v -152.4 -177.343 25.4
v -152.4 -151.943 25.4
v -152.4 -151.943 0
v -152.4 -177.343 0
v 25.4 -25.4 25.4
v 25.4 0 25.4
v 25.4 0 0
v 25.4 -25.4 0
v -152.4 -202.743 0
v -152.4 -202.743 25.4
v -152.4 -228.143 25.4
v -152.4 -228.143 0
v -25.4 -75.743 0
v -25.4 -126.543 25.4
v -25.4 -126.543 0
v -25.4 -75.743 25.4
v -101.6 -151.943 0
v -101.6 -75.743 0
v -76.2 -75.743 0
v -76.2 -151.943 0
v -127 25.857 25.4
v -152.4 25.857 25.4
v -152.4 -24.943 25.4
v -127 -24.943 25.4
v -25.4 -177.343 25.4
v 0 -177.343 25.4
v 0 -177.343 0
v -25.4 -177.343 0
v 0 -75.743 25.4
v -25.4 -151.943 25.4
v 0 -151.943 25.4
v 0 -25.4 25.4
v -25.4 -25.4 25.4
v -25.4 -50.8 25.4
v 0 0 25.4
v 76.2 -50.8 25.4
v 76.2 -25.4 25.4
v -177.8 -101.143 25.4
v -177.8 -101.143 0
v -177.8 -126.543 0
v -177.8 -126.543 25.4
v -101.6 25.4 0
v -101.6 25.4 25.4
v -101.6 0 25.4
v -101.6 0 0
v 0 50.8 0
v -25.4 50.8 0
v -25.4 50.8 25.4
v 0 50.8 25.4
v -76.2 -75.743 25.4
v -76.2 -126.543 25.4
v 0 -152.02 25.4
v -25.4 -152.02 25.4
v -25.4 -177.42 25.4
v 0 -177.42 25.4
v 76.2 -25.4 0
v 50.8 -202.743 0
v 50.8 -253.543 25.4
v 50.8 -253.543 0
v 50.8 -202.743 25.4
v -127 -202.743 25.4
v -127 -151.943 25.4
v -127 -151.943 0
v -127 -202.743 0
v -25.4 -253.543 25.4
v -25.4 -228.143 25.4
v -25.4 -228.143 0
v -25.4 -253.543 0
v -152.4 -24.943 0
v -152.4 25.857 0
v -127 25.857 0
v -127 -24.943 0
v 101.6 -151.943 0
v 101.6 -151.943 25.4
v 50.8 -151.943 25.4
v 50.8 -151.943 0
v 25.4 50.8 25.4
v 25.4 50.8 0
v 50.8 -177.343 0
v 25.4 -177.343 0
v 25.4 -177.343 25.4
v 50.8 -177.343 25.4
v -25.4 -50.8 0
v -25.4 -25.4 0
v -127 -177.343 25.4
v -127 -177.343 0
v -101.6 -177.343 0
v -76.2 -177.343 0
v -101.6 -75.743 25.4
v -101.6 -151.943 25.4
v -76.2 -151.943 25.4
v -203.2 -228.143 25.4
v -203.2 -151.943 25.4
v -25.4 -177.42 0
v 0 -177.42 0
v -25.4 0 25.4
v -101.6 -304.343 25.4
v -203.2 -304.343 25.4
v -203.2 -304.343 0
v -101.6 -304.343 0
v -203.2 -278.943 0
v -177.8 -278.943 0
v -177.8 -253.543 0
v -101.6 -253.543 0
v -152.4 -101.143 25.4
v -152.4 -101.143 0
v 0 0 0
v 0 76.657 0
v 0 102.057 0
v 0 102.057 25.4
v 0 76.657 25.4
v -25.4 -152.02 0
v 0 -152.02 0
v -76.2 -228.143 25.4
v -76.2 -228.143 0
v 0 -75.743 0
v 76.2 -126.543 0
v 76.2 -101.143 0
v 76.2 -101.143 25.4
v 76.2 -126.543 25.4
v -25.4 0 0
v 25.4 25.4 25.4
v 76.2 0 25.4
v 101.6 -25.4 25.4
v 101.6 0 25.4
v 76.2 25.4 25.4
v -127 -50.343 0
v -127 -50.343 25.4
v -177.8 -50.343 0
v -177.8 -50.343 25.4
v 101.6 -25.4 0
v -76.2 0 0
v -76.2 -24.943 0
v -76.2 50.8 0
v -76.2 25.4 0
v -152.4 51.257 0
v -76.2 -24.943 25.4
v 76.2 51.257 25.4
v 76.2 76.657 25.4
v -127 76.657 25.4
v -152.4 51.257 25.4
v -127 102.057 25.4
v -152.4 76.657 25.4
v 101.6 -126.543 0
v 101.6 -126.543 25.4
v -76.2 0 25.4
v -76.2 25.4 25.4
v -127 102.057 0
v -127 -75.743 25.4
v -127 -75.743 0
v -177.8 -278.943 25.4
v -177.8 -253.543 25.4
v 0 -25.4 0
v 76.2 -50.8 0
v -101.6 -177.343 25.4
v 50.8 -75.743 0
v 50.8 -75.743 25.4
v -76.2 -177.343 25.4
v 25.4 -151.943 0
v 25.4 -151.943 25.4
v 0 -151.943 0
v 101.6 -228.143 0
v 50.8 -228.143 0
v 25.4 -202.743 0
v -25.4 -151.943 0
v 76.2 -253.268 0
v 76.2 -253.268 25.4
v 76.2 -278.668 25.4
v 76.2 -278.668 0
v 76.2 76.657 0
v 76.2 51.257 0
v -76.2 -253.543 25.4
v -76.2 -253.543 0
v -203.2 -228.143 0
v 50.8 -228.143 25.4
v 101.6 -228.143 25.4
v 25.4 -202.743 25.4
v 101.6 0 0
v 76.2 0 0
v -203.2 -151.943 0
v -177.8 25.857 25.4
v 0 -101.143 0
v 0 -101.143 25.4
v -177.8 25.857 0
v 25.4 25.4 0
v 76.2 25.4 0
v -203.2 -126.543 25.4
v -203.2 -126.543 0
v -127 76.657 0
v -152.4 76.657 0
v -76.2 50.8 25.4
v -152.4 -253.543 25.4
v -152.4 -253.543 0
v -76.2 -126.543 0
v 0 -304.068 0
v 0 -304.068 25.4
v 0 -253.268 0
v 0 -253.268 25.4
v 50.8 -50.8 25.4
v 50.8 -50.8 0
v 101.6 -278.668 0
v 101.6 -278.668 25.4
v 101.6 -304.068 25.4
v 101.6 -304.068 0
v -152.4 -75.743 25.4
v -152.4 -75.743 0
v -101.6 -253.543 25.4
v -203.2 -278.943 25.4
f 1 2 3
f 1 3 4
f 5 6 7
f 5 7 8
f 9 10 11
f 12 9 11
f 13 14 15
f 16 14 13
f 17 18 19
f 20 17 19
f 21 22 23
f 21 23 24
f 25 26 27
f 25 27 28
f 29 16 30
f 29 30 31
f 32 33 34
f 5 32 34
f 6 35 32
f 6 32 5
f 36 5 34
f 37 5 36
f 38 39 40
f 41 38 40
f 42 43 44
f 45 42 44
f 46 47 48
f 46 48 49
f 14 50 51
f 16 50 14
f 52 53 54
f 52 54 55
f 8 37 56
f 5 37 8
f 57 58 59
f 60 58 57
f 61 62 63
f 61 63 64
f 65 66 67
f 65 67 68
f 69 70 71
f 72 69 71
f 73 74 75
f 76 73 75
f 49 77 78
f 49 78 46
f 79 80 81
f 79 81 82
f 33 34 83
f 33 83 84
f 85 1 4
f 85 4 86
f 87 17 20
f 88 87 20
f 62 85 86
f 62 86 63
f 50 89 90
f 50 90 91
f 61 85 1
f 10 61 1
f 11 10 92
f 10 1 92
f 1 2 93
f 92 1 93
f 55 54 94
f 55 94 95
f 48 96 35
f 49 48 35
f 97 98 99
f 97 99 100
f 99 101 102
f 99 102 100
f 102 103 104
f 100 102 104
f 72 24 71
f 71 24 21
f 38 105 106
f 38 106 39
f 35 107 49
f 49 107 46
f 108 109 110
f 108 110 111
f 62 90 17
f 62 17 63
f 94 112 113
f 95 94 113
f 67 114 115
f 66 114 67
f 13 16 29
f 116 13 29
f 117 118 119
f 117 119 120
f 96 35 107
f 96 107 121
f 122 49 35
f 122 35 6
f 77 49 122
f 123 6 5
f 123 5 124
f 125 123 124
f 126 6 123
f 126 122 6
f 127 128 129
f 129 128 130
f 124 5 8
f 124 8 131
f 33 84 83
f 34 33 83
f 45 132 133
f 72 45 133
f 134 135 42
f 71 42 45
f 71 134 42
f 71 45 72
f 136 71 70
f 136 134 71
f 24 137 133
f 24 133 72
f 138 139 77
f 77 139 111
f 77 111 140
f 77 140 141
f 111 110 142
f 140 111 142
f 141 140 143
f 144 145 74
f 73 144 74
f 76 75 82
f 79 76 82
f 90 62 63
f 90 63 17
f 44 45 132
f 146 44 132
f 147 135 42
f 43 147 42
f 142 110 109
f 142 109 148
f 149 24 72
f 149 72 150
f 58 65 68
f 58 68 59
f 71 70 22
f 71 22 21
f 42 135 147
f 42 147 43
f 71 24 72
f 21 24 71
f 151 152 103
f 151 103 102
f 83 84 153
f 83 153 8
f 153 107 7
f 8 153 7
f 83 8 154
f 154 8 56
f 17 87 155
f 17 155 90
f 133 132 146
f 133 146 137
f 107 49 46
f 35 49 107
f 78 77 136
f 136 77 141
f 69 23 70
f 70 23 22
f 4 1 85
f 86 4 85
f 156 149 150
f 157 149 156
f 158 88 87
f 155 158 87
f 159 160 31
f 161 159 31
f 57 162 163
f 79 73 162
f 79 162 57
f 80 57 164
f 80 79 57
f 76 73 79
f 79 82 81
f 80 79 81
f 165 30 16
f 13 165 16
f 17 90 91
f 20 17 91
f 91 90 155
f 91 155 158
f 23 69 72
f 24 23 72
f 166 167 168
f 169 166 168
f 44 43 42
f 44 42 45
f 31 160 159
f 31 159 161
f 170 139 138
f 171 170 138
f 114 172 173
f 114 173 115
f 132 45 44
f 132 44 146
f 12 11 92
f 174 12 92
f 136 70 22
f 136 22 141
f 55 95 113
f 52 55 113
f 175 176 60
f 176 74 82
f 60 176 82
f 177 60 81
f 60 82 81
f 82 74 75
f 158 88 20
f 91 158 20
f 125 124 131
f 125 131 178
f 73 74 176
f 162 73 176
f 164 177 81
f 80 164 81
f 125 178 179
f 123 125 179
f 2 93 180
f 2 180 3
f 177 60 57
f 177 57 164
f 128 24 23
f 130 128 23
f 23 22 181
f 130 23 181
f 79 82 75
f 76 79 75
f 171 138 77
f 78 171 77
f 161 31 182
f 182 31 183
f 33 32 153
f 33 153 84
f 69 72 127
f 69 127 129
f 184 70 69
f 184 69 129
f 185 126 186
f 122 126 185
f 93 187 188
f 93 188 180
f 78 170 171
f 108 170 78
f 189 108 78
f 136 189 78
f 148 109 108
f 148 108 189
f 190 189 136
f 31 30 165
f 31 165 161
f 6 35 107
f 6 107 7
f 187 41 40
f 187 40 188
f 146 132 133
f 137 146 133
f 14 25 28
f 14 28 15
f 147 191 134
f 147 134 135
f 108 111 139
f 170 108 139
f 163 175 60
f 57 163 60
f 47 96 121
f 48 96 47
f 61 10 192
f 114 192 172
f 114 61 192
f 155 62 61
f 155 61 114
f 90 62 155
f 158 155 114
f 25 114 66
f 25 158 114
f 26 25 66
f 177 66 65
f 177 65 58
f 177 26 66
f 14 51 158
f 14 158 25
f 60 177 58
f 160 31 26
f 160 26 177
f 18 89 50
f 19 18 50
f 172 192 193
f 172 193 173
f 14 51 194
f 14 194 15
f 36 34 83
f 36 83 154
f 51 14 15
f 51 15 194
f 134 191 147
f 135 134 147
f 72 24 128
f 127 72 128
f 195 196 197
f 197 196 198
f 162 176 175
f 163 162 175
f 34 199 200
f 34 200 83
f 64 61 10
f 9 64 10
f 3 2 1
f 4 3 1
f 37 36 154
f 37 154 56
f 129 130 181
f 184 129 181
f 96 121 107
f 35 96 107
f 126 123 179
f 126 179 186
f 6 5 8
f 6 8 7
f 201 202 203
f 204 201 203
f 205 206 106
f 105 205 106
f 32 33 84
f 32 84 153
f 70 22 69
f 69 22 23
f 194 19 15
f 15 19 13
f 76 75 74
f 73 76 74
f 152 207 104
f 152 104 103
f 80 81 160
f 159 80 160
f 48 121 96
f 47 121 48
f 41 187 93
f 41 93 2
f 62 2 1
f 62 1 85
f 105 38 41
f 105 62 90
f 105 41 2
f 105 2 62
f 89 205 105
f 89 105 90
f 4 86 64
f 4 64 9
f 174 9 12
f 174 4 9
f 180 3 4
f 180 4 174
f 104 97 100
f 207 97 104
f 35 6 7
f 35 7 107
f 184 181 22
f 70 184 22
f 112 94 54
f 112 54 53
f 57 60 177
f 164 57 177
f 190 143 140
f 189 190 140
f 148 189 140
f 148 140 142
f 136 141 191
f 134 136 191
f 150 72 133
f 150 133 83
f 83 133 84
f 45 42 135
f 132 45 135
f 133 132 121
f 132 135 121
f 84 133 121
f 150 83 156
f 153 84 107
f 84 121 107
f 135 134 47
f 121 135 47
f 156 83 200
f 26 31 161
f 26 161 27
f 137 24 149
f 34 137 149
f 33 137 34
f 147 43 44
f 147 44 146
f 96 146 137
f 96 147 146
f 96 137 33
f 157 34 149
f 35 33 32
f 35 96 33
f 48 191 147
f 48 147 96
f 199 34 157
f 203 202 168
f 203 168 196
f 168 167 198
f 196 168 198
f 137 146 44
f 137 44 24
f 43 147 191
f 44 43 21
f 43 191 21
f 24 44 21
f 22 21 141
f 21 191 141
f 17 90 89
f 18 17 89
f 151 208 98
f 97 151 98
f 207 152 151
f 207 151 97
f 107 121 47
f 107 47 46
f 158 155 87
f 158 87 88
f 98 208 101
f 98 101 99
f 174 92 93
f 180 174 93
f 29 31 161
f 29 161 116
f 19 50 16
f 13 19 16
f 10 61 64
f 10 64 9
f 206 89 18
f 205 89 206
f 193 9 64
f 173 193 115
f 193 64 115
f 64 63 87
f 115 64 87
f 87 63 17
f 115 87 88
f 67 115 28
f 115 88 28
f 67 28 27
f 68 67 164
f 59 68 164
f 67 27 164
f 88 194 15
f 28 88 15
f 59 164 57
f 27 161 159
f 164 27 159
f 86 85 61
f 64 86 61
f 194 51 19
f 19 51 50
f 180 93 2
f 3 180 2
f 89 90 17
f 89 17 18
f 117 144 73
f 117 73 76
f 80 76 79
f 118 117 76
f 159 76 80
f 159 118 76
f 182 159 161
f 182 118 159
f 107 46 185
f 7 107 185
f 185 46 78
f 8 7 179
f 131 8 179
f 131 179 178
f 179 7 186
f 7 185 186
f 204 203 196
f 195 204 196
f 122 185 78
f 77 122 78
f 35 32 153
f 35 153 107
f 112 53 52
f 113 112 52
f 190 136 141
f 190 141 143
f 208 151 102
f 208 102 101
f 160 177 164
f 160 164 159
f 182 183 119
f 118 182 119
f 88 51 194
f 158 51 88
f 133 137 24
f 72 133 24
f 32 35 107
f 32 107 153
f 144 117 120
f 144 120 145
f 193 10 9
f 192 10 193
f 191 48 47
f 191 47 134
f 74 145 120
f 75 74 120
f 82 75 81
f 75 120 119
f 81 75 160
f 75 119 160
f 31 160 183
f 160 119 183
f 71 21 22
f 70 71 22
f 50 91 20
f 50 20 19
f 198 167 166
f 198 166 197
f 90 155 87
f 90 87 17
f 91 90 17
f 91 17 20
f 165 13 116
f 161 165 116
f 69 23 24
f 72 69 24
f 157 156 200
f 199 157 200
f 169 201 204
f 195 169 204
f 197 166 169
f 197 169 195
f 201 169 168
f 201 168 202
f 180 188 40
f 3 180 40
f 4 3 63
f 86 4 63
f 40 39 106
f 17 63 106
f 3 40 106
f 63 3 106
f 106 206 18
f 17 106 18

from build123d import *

# Parameters (mm, degrees)
SKETCH1_W              = 25.4
SKETCH1_H              = 50.8
BOSS_EXTRUDE1_DEPTH    = 25.4
BOSS_EXTRUDE2_DEPTH    = 25.4
BOSS_EXTRUDE10_DEPTH   = 25.4
BOSS_EXTRUDE12_DEPTH   = 25.4
BOSS_EXTRUDE13_DEPTH   = 25.4
SKETCH8_W              = 25.4
SKETCH8_H              = 50.8
BOSS_EXTRUDE14_DEPTH   = 25.4
BOSS_EXTRUDE15_DEPTH   = 25.4
BOSS_EXTRUDE16_DEPTH   = 25.4
SKETCH11_W             = 50.8
SKETCH11_H             = 50.8
BOSS_EXTRUDE17_DEPTH   = 25.4
BOSS_EXTRUDE17_2_DEPTH = 25.4
BOSS_EXTRUDE26_DEPTH   = 25.4
SKETCH23_W             = 25.4
SKETCH23_H             = 76.2
BOSS_EXTRUDE35_DEPTH   = 25.4
BOSS_EXTRUDE35_2_DEPTH = 25.4
SKETCH12_W             = 25.4
SKETCH12_H             = 25.4
BOSS_EXTRUDE36_DEPTH   = 25.4
BOSS_EXTRUDE36_2_DEPTH = 25.4
BOSS_EXTRUDE37_DEPTH   = 25.4
BOSS_EXTRUDE38_DEPTH   = 25.4
BOSS_EXTRUDE39_DEPTH   = 25.4
BOSS_EXTRUDE40_DEPTH   = 25.4
BOSS_EXTRUDE41_DEPTH   = 25.4


with BuildPart() as part:
    # Sketch1 → Boss-Extrude1 (new body)
    with BuildSketch(Plane.XY):
        with Locations((-12.7, 25.4)):
            Rectangle(SKETCH1_W, SKETCH1_H)
    extrude(amount=BOSS_EXTRUDE1_DEPTH)


with BuildPart() as body_2:
    # Sketch2 → Boss-Extrude2 (new body)
    with BuildSketch(Plane.XY.offset(25.4)):
        Polygon((0, 0), (0, -25.4), (-25.4, -25.4), (-25.4, -50.8), (76.2, -50.8), (76.2, -25.4), (25.4, -25.4), (25.4, 0), align=None)
    extrude(amount=-BOSS_EXTRUDE2_DEPTH)


with BuildPart() as body_3:
    # Sketch3 → Boss-Extrude10 (new body)
    with BuildSketch(Plane.XY.offset(25.4)):
        Polygon((76.2, -25.4), (101.6, -25.4), (101.6, 0), (76.2, 0), (76.2, 25.4), (25.4, 25.4), (25.4, 50.8), (0, 50.8), (0, 0), (25.4, 0), (25.4, -25.4), align=None)
    extrude(amount=-BOSS_EXTRUDE10_DEPTH)


with BuildPart() as body_4:
    # Sketch6 → Boss-Extrude12 (new body)
    with BuildSketch(Plane.XY.offset(25.4)):
        Polygon((-25.4, 50.8), (-76.2, 50.8), (-76.2, 25.4), (-101.6, 25.4), (-101.6, 0), (-76.2, 0), (-76.2, -24.942601225), (-127, -24.942601225), (-127, -75.742601225), (50.8, -75.742601225), (50.8, -50.8), (-25.4, -50.8), (-25.4, -25.4), (0, -25.4), (0, 0), (-25.4, 0), align=None)
    extrude(amount=-BOSS_EXTRUDE12_DEPTH)


with BuildPart() as body_5:
    # Sketch7 → Boss-Extrude13 (new body)
    with BuildSketch(Plane.XY.offset(25.4)):
        Polygon((-127, -24.942601225), (-127, 25.857398775), (-152.4, 25.857398775), (-152.4, 51.257398775), (-76.2, 50.8), (-76.2, 25.4), (-101.6, 25.4), (-101.6, 0), (-76.2, 0), (-76.2, -24.942601225), align=None)
    extrude(amount=-BOSS_EXTRUDE13_DEPTH)


with BuildPart() as body_6:
    # Sketch8 → Boss-Extrude14 (new body)
    with BuildSketch(Plane.XY.offset(25.4)):
        with Locations((-139.7, 0.457398775)):
            Rectangle(SKETCH8_W, SKETCH8_H)
    extrude(amount=-BOSS_EXTRUDE14_DEPTH)


with BuildPart() as body_7:
    # Sketch9 → Boss-Extrude15 (new body)
    with BuildSketch(Plane.XY.offset(25.4)):
        Polygon((-152.4, 25.857398775), (-152.4, -24.942601225), (-127, -24.942601225), (-127, -50.342601225), (-177.8, -50.342601225), (-177.8, 25.857398775), align=None)
    extrude(amount=-BOSS_EXTRUDE15_DEPTH)


with BuildPart() as body_8:
    # Sketch10 → Boss-Extrude16 (new body)
    with BuildSketch(Plane.XY.offset(25.4)):
        Polygon((-152.4, 51.257398775), (-152.4, 76.657398775), (-127, 76.657398775), (-127, 102.057398775), (-22.654819882, 102.057398775), (0, 102.057398775), (0, 76.657398775), (76.2, 76.657398775), (76.2, 51.257398775), (25.4, 50.8), align=None)
    extrude(amount=-BOSS_EXTRUDE16_DEPTH)


with BuildPart() as body_9:
    # Sketch11 → Boss-Extrude17 (new body)
    with BuildSketch(Plane.XY.offset(25.4)):
        with Locations((-50.8, -101.142601225)):
            Rectangle(SKETCH11_W, SKETCH11_H)
    extrude(amount=-BOSS_EXTRUDE17_DEPTH)


with BuildPart() as body_10:
    # Sketch11 → Boss-Extrude17 2 (new body)
    with BuildSketch(Plane.XY.offset(25.4)):
        Polygon((-101.6, -151.942601225), (-101.6, -75.742601225), (-127, -75.742601225), (-152.4, -75.742601225), (-152.4, -101.142601225), (-177.8, -101.142601225), (-177.8, -126.542601225), (-203.2, -126.542601225), (-203.2, -151.942601225), (-152.4, -151.942601225), (-152.4, -177.342601225), (-127, -177.342601225), (-127, -151.942601225), align=None)
    extrude(amount=-BOSS_EXTRUDE17_2_DEPTH)


with BuildPart() as body_11:
    # Sketch13 → Boss-Extrude26 (new body)
    with BuildSketch(Plane.XY.offset(25.4)):
        Polygon((-152.4, -177.342601225), (-127, -177.342601225), (-127, -202.742601225), (-152.4, -202.742601225), (-152.4, -228.142601225), (-203.2, -228.142601225), (-203.2, -151.942601225), (-152.4, -151.942601225), align=None)
    extrude(amount=-BOSS_EXTRUDE26_DEPTH)


with BuildPart() as body_12:
    # Sketch23 → Boss-Extrude35 (new body)
    with BuildSketch(Plane.XY.offset(25.4)):
        with Locations((-88.9, -113.842601225)):
            Rectangle(SKETCH23_W, SKETCH23_H)
    extrude(amount=-BOSS_EXTRUDE35_DEPTH)


with BuildPart() as body_13:
    # Sketch23 → Boss-Extrude35 2 (new body)
    with BuildSketch(Plane.XY.offset(25.4)):
        with Locations((-12.7, -113.842601225)):
            Rectangle(SKETCH23_W, SKETCH23_H)
    extrude(amount=-BOSS_EXTRUDE35_2_DEPTH)


with BuildPart() as body_14:
    # Sketch12 → Boss-Extrude36 (new body)
    with BuildSketch(Plane.XY.offset(25.4)):
        with Locations((-88.9, -164.642601225)):
            Rectangle(SKETCH12_W, SKETCH12_H)
    extrude(amount=-BOSS_EXTRUDE36_DEPTH)


with BuildPart() as body_15:
    # Sketch12 → Boss-Extrude36 2 (new body)
    with BuildSketch(Plane.XY.offset(25.4)):
        with Locations((-12.7, -164.719828194)):
            Rectangle(SKETCH12_W, SKETCH12_H)
    extrude(amount=-BOSS_EXTRUDE36_2_DEPTH)


with BuildPart() as body_16:
    # Sketch24 → Boss-Extrude37 (new body)
    with BuildSketch(Plane.XY.offset(25.4)):
        Polygon((-25.4, -126.542601225), (-76.2, -126.542601225), (-76.2, -177.342601225), (-101.6, -177.342601225), (-101.6, -151.942601225), (-127, -151.942601225), (-127, -202.742601225), (-152.4, -202.742601225), (-152.4, -253.542601225), (-76.2, -253.542601225), (-76.2, -228.142601225), (-25.4, -228.142601225), (-25.4, -253.542601225), (50.8, -253.542601225), (50.8, -202.742601225), (25.4, -202.742601225), (25.4, -151.942601225), (0, -151.942601225), (0, -177.342601225), (-25.4, -177.342601225), align=None)
    extrude(amount=-BOSS_EXTRUDE37_DEPTH)


with BuildPart() as body_17:
    # Sketch25 → Boss-Extrude38 (new body)
    with BuildSketch(Plane.XY.offset(25.4)):
        Polygon((-152.4, -253.542601225), (-177.8, -253.542601225), (-177.8, -278.942601225), (-203.2, -278.942601225), (-203.2, -304.342601225), (-101.6, -304.342601225), (-101.6, -253.542601225), align=None)
    extrude(amount=-BOSS_EXTRUDE38_DEPTH)


with BuildPart() as body_18:
    # Sketch26 → Boss-Extrude39 (new body)
    with BuildSketch(Plane.XY.offset(25.4)):
        Polygon((50.8, -253.26839435), (76.2, -253.26839435), (76.2, -278.66839435), (101.6, -278.66839435), (101.6, -304.06839435), (0, -304.06839435), (0, -253.26839435), align=None)
    extrude(amount=-BOSS_EXTRUDE39_DEPTH)


with BuildPart() as body_19:
    # Sketch27 → Boss-Extrude40 (new body)
    with BuildSketch(Plane.XY.offset(25.4)):
        Polygon((25.4, -151.942601225), (0, -151.942601225), (0, -101.142601225), (76.2, -101.142601225), (76.2, -126.542601225), (101.6, -126.542601225), (101.6, -151.942601225), (50.8, -151.942601225), (50.8, -177.342601225), (25.4, -177.342601225), align=None)
    extrude(amount=-BOSS_EXTRUDE40_DEPTH)


with BuildPart() as body_20:
    # Sketch28 → Boss-Extrude41 (new body)
    with BuildSketch(Plane.XY.offset(25.4)):
        Polygon((25.4, -177.342601225), (50.8, -177.342601225), (50.8, -151.942601225), (101.6, -151.942601225), (101.6, -228.142601225), (50.8, -228.142601225), (50.8, -202.742601225), (25.4, -202.742601225), align=None)
    extrude(amount=-BOSS_EXTRUDE41_DEPTH)


solid = Compound([part.part, body_2.part, body_3.part, body_4.part, body_5.part, body_6.part, body_7.part, body_8.part, body_9.part, body_10.part, body_11.part, body_12.part, body_13.part, body_14.part, body_15.part, body_16.part, body_17.part, body_18.part, body_19.part, body_20.part])
